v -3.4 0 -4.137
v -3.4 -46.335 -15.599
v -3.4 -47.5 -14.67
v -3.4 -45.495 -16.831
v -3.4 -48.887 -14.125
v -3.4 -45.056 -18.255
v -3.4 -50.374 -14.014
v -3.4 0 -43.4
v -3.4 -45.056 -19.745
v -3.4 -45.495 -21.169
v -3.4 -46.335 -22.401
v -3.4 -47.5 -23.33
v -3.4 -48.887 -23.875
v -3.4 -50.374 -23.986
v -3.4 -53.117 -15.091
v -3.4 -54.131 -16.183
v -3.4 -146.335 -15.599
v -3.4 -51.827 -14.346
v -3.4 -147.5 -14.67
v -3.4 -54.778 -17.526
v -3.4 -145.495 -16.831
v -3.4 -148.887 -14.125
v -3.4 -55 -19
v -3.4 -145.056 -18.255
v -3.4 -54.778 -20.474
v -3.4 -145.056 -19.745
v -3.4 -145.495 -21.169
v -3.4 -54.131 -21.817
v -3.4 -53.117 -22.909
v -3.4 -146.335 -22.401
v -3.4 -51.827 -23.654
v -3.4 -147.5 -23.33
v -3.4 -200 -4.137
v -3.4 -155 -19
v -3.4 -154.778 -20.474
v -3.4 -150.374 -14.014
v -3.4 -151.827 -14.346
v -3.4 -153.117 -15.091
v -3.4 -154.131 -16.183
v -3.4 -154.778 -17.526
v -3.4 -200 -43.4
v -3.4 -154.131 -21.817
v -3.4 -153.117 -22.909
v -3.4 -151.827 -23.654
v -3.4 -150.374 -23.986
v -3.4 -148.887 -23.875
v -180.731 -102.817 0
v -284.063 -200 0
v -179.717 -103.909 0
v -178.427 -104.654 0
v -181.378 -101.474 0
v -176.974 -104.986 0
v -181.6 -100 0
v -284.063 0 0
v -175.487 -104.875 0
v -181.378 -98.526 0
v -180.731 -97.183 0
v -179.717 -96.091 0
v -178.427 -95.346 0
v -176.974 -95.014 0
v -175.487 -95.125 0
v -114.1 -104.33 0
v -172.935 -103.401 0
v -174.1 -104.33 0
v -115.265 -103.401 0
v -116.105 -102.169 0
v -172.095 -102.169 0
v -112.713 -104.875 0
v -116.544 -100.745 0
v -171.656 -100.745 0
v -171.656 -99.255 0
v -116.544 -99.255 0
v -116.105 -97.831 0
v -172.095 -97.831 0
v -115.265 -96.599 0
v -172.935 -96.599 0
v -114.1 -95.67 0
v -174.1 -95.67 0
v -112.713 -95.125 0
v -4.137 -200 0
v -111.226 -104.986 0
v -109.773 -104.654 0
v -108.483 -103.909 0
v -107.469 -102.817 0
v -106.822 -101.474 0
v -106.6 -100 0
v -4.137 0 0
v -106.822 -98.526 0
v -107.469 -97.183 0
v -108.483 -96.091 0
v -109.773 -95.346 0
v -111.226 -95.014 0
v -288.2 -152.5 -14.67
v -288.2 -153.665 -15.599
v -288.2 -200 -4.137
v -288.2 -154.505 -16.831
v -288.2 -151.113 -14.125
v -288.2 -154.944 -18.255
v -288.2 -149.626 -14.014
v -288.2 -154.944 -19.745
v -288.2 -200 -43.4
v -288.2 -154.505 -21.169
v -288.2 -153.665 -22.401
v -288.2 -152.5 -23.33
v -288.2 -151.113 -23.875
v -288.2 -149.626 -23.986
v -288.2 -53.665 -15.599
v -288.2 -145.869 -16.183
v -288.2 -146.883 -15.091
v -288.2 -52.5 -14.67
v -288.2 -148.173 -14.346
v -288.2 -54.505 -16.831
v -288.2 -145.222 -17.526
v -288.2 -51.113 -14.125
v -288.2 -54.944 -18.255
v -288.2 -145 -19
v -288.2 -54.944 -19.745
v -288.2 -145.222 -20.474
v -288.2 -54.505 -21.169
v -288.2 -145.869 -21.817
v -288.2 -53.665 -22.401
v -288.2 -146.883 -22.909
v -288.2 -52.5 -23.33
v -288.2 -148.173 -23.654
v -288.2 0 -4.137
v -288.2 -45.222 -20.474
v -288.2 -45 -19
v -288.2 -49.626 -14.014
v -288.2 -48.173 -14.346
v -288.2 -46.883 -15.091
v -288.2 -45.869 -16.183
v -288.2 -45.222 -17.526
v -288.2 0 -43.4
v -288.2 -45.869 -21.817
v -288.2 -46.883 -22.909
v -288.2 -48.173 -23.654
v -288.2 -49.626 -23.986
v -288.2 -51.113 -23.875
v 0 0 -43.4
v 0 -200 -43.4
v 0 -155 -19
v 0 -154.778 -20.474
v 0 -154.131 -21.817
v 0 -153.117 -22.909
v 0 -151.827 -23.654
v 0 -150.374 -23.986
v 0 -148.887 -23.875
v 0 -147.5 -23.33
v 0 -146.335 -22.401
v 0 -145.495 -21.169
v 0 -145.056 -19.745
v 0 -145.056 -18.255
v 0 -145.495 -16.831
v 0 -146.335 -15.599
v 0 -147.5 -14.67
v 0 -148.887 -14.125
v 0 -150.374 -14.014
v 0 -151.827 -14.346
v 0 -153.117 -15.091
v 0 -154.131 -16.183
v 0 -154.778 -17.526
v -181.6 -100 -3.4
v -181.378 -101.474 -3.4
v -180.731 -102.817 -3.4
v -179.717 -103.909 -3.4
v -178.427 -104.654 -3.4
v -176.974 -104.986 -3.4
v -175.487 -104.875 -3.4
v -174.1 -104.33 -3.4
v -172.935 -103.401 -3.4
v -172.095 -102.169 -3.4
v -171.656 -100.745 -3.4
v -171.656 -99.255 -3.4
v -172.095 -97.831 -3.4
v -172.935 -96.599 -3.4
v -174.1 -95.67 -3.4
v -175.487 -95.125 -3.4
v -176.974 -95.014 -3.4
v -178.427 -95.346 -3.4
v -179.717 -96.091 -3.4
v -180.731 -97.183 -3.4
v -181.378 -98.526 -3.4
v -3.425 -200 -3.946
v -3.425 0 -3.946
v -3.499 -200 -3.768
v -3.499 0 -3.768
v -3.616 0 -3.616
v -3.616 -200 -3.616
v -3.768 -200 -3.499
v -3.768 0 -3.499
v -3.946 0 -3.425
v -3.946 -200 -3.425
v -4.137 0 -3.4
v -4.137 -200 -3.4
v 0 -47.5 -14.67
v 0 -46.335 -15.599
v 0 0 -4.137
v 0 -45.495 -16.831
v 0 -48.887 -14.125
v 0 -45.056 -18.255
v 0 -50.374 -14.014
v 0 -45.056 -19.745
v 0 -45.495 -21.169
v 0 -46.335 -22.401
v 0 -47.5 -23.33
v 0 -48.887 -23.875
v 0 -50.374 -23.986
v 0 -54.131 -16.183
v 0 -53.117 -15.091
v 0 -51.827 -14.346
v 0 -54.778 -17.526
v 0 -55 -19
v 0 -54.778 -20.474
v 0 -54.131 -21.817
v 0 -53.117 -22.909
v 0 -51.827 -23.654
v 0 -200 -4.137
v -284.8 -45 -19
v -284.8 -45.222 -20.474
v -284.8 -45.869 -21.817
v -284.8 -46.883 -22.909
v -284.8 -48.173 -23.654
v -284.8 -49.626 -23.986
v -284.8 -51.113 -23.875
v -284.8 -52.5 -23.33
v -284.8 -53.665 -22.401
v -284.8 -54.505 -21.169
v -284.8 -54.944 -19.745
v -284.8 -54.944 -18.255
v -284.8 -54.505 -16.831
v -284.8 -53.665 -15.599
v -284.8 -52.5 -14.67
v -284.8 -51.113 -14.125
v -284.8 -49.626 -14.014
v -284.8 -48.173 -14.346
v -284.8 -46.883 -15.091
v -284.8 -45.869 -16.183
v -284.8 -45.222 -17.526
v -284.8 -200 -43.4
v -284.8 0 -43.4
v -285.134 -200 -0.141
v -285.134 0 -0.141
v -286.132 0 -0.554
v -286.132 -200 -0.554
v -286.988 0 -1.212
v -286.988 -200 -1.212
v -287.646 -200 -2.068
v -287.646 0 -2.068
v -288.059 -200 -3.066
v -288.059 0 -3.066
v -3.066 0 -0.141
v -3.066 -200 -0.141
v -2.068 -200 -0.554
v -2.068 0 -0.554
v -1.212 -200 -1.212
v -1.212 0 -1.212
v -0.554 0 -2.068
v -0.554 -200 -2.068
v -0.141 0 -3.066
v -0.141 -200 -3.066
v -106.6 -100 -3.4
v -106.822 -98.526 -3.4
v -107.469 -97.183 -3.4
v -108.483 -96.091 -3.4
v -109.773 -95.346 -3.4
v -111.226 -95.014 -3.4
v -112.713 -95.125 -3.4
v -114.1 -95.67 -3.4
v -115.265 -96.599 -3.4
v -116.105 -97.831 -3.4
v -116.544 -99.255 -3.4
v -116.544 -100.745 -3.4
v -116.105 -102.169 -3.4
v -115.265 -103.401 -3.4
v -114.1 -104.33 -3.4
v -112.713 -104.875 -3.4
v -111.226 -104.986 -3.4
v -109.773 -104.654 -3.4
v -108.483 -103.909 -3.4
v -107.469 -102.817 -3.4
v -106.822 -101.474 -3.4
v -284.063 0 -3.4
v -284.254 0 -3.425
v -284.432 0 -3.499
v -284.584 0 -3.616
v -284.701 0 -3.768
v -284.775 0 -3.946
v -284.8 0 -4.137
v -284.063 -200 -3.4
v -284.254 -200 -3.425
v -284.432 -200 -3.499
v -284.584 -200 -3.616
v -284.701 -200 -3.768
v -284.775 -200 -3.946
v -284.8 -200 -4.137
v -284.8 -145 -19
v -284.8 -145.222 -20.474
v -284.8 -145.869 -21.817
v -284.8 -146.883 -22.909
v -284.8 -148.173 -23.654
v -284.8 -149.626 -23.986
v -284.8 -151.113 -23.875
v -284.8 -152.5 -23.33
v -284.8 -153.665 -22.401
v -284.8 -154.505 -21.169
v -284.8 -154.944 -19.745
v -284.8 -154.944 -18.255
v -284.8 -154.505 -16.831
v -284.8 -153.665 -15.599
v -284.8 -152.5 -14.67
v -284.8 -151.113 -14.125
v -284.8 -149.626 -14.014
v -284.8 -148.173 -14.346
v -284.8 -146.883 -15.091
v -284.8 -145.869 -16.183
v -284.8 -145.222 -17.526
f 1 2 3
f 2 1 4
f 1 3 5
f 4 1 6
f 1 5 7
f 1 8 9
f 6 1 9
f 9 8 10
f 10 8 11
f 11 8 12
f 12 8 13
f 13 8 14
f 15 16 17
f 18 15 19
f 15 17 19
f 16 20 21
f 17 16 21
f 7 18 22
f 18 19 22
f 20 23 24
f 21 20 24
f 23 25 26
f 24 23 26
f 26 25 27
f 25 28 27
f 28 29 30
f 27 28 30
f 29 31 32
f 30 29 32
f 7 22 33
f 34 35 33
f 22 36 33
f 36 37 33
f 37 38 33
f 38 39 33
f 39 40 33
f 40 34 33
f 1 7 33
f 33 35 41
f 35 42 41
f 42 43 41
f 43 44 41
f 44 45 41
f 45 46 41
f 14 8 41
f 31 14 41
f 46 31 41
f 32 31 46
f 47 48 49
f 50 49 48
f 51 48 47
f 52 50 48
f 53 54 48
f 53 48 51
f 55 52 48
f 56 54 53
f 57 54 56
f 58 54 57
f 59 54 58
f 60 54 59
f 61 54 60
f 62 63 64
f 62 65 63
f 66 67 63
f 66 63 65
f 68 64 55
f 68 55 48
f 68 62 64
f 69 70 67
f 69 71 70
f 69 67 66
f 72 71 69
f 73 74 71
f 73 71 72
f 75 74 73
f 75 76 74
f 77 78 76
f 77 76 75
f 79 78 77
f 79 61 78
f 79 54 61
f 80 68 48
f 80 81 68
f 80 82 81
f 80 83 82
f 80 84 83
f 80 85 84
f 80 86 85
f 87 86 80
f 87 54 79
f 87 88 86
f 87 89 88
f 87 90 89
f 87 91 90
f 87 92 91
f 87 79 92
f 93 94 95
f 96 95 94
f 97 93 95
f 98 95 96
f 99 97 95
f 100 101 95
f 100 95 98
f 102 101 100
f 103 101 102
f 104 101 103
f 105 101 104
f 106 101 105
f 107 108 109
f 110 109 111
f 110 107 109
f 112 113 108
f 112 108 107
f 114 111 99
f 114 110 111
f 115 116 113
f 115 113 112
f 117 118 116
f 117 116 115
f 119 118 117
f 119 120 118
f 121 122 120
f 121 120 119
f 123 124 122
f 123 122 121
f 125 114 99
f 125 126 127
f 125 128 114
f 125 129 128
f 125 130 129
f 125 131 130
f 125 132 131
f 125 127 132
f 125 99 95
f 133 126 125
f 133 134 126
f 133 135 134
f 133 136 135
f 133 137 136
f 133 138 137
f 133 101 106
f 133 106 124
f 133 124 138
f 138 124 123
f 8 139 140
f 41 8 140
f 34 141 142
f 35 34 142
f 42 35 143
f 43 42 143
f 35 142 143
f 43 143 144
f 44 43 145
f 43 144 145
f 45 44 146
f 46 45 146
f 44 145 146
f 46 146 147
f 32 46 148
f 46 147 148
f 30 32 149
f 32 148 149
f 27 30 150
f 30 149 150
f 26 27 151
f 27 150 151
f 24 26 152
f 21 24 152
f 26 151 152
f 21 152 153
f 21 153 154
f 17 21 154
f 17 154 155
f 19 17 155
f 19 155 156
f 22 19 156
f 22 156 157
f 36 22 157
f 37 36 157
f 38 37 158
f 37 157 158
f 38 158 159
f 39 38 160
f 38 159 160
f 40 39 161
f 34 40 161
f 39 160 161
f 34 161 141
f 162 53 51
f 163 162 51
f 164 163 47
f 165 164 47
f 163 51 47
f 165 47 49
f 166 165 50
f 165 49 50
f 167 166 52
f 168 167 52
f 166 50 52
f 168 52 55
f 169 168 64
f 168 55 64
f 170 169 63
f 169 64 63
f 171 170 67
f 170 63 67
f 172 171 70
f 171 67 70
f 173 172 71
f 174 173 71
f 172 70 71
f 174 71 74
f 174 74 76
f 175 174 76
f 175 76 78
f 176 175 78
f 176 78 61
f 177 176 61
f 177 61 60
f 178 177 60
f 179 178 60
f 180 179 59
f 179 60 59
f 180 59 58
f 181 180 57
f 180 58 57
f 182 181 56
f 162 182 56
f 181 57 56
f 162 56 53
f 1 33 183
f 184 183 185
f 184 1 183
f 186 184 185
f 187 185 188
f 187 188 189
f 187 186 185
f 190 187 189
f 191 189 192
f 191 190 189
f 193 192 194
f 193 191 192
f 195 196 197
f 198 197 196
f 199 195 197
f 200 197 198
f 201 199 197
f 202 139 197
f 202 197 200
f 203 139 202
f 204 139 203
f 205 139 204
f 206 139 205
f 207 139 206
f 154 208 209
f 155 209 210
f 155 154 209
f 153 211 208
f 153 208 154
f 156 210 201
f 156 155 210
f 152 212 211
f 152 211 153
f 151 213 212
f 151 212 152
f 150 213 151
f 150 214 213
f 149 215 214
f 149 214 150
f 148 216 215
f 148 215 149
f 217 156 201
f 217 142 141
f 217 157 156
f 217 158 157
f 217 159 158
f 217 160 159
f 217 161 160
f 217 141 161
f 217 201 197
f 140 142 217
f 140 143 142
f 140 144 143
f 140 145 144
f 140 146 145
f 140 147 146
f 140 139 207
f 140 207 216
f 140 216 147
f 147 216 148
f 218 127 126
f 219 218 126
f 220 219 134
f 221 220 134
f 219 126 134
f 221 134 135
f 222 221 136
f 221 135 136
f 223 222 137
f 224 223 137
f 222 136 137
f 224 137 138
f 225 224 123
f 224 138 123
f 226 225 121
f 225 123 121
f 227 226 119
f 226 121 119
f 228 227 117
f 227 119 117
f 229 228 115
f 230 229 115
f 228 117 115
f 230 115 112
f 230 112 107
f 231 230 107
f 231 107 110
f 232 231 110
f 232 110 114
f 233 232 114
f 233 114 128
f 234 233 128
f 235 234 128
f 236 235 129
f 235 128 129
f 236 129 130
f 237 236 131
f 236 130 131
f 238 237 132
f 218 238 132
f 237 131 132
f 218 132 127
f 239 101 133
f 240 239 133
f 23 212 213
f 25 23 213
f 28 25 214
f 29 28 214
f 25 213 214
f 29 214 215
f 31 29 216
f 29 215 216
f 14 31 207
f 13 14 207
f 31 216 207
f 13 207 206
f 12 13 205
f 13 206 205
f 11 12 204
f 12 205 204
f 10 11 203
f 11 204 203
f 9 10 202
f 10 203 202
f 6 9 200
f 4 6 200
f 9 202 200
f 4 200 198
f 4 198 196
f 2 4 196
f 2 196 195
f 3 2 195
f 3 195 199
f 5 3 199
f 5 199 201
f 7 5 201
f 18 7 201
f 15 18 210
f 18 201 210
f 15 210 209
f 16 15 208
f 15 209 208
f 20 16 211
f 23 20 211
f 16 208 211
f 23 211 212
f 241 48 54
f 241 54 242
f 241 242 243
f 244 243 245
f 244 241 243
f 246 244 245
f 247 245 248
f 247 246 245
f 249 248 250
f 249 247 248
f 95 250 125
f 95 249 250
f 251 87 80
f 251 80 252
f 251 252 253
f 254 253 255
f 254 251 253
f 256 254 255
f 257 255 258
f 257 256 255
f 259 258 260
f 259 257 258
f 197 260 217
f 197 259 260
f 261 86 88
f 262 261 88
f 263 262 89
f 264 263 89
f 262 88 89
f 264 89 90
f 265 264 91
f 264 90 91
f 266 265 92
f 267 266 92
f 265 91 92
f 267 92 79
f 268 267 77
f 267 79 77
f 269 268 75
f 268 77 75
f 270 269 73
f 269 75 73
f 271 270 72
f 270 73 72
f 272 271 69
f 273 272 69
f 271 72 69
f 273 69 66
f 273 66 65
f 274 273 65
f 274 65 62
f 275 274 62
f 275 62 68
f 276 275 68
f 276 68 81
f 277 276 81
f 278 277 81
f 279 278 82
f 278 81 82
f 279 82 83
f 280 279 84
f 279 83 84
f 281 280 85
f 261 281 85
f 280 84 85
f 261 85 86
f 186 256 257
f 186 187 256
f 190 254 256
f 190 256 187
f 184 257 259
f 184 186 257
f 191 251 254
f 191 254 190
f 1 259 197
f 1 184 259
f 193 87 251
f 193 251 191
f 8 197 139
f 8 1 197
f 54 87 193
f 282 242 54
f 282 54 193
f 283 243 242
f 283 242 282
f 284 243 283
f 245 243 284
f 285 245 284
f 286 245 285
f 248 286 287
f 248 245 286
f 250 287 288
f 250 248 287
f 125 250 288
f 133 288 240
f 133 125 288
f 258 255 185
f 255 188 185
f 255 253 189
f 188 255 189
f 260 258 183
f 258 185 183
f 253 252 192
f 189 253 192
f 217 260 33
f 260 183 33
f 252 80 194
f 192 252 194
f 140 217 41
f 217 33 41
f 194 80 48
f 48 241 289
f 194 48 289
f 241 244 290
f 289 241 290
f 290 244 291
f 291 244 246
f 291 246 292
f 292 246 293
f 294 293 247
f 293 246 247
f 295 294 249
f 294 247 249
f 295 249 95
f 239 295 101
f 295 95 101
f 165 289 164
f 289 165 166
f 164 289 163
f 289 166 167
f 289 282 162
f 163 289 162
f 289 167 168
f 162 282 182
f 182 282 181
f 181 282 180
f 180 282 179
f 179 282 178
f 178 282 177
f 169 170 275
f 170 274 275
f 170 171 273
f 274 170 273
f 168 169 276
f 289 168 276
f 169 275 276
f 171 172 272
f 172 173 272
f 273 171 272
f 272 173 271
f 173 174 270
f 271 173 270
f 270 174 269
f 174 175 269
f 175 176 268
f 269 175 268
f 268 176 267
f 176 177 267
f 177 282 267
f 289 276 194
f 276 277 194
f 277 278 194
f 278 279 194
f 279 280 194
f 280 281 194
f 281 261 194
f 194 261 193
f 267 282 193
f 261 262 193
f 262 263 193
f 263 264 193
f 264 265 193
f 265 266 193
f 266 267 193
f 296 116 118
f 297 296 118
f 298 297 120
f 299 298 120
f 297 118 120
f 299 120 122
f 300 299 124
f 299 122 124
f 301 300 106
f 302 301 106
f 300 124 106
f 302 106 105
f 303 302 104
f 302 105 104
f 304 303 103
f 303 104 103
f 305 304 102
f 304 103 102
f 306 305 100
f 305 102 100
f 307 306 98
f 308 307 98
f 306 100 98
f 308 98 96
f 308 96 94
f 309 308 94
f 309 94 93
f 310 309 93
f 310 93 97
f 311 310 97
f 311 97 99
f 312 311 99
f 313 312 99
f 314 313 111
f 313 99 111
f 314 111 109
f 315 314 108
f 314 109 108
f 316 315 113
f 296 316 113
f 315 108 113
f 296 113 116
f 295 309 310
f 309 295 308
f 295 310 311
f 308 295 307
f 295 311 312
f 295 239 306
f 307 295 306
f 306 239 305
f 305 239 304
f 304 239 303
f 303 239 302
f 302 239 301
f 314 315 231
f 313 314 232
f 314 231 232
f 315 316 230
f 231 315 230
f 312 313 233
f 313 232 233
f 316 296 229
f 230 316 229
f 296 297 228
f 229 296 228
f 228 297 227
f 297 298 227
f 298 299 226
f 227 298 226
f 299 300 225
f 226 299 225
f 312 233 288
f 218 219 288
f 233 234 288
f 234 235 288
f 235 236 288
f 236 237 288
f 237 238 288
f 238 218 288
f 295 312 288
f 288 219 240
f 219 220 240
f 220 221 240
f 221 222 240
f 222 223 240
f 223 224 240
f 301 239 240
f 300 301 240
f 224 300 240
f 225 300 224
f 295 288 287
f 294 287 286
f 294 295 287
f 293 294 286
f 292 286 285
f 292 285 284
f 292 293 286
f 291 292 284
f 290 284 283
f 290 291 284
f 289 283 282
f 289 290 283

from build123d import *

# Parameters (mm, degrees)
SKETCH1_W                    = 288.2
SKETCH1_H                    = 200
SKETCH1_R                    = 5
BASE_FLANGE1_DEPTH           = 3.4
EDGE_FLANGE2_STRIP_W         = 15.0732
EDGE_FLANGE2_STRIP_H         = 3.4
EDGE_FLANGE2_STRIP_CUT_DEPTH = 200
EDGE_FLANGE2_DEPTH           = 200
EDGE_FLANGE2_PROFILE_W       = 200
EDGE_FLANGE2_PROFILE_H       = 39.2634
EDGE_FLANGE2_PROFILE_R       = 5
EDGE_FLANGE2_FLAT_DEPTH      = 3.4
EDGE_FLANGE3_STRIP_W         = 15.0732
EDGE_FLANGE3_STRIP_H         = 3.4
EDGE_FLANGE3_STRIP_CUT_DEPTH = 200
EDGE_FLANGE3_DEPTH           = 200
EDGE_FLANGE3_PROFILE_W       = 200
EDGE_FLANGE3_PROFILE_H       = 39.2634
EDGE_FLANGE3_PROFILE_R       = 5
EDGE_FLANGE3_FLAT_DEPTH      = 3.4


# Sheet-metal steps are written as plain solids
with BuildPart() as part:
    # Sketch1 → Base-Flange1 (new body)
    with BuildSketch(Plane.XY):
        with Locations((-144.1, -100)):
            Rectangle(SKETCH1_W, SKETCH1_H)
        with Locations((-111.6, -100)):
            Circle(SKETCH1_R, mode=Mode.SUBTRACT)
        with Locations(Location((-176.6, -100, 0), (0, 0, 180))):
            Circle(SKETCH1_R, mode=Mode.SUBTRACT)
    extrude(amount=-BASE_FLANGE1_DEPTH)

    # Edge-Flange2 strip (across the edge) → Edge-Flange2 strip cut (cut)
    with BuildSketch(Plane(origin=(0, 0, -3.4), x_dir=(-1, 0, 0), z_dir=(0, -1, 0))):
        with Locations((-3.4, -1.7)):
            Rectangle(EDGE_FLANGE2_STRIP_W, EDGE_FLANGE2_STRIP_H)
    extrude(amount=EDGE_FLANGE2_STRIP_CUT_DEPTH, mode=Mode.SUBTRACT)

    # Edge-Flange2 bend section (across the edge) → Edge-Flange2 (add)
    with BuildSketch(Plane(origin=(0, 0, -3.4), x_dir=(-1, 0, 0), z_dir=(0, -1, 0))):
        with BuildLine():
            Line((0, 0.7366), (3.4, 0.7366))
            ThreePointArc((3.4, 0.7366), (3.615745145, 0.215745145), (4.1366, 0))
            Line((4.1366, 0), (4.1366, -3.4))
            ThreePointArc((4.1366, -3.4), (1.211582089, -2.188417911), (0, 0.7366))
        make_face()
    extrude(amount=EDGE_FLANGE2_DEPTH)

    # Edge-Flange2 profile (on flange) → Edge-Flange2 flat (add)
    with BuildSketch(Plane(origin=(0, 0, -3.4), x_dir=(0, -1, 0), z_dir=(1, 0, 0))):
        with Locations((100, 20.3683)):
            Rectangle(EDGE_FLANGE2_PROFILE_W, EDGE_FLANGE2_PROFILE_H)
        with Locations((150, 15.6)):
            Circle(EDGE_FLANGE2_PROFILE_R, mode=Mode.SUBTRACT)
        with Locations((50, 15.6)):
            Circle(EDGE_FLANGE2_PROFILE_R, mode=Mode.SUBTRACT)
    extrude(amount=-EDGE_FLANGE2_FLAT_DEPTH)

    # Edge-Flange3 strip (across the edge) → Edge-Flange3 strip cut (cut)
    with BuildSketch(Plane(origin=(-288.2, -200, -3.4), x_dir=(1, 0, 0), z_dir=(0, 1, 0))):
        with Locations((-3.4, -1.7)):
            Rectangle(EDGE_FLANGE3_STRIP_W, EDGE_FLANGE3_STRIP_H)
    extrude(amount=EDGE_FLANGE3_STRIP_CUT_DEPTH, mode=Mode.SUBTRACT)

    # Edge-Flange3 bend section (across the edge) → Edge-Flange3 (add)
    with BuildSketch(Plane(origin=(-288.2, -200, -3.4), x_dir=(1, 0, 0), z_dir=(0, 1, 0))):
        with BuildLine():
            Line((0, 0.7366), (3.4, 0.7366))
            ThreePointArc((3.4, 0.7366), (3.615745145, 0.215745145), (4.1366, 0))
            Line((4.1366, 0), (4.1366, -3.4))
            ThreePointArc((4.1366, -3.4), (1.211582089, -2.188417911), (0, 0.7366))
        make_face()
    extrude(amount=EDGE_FLANGE3_DEPTH)

    # Edge-Flange3 profile (on flange) → Edge-Flange3 flat (add)
    with BuildSketch(Plane(origin=(-288.2, 0, -3.4), x_dir=(0, 1, 0), z_dir=(-1, 0, 0))):
        with Locations((-100, 20.3683)):
            Rectangle(EDGE_FLANGE3_PROFILE_W, EDGE_FLANGE3_PROFILE_H)
        with Locations((-50, 15.6)):
            Circle(EDGE_FLANGE3_PROFILE_R, mode=Mode.SUBTRACT)
        with Locations((-150, 15.6)):
            Circle(EDGE_FLANGE3_PROFILE_R, mode=Mode.SUBTRACT)
    extrude(amount=-EDGE_FLANGE3_FLAT_DEPTH)


solid = part.part
